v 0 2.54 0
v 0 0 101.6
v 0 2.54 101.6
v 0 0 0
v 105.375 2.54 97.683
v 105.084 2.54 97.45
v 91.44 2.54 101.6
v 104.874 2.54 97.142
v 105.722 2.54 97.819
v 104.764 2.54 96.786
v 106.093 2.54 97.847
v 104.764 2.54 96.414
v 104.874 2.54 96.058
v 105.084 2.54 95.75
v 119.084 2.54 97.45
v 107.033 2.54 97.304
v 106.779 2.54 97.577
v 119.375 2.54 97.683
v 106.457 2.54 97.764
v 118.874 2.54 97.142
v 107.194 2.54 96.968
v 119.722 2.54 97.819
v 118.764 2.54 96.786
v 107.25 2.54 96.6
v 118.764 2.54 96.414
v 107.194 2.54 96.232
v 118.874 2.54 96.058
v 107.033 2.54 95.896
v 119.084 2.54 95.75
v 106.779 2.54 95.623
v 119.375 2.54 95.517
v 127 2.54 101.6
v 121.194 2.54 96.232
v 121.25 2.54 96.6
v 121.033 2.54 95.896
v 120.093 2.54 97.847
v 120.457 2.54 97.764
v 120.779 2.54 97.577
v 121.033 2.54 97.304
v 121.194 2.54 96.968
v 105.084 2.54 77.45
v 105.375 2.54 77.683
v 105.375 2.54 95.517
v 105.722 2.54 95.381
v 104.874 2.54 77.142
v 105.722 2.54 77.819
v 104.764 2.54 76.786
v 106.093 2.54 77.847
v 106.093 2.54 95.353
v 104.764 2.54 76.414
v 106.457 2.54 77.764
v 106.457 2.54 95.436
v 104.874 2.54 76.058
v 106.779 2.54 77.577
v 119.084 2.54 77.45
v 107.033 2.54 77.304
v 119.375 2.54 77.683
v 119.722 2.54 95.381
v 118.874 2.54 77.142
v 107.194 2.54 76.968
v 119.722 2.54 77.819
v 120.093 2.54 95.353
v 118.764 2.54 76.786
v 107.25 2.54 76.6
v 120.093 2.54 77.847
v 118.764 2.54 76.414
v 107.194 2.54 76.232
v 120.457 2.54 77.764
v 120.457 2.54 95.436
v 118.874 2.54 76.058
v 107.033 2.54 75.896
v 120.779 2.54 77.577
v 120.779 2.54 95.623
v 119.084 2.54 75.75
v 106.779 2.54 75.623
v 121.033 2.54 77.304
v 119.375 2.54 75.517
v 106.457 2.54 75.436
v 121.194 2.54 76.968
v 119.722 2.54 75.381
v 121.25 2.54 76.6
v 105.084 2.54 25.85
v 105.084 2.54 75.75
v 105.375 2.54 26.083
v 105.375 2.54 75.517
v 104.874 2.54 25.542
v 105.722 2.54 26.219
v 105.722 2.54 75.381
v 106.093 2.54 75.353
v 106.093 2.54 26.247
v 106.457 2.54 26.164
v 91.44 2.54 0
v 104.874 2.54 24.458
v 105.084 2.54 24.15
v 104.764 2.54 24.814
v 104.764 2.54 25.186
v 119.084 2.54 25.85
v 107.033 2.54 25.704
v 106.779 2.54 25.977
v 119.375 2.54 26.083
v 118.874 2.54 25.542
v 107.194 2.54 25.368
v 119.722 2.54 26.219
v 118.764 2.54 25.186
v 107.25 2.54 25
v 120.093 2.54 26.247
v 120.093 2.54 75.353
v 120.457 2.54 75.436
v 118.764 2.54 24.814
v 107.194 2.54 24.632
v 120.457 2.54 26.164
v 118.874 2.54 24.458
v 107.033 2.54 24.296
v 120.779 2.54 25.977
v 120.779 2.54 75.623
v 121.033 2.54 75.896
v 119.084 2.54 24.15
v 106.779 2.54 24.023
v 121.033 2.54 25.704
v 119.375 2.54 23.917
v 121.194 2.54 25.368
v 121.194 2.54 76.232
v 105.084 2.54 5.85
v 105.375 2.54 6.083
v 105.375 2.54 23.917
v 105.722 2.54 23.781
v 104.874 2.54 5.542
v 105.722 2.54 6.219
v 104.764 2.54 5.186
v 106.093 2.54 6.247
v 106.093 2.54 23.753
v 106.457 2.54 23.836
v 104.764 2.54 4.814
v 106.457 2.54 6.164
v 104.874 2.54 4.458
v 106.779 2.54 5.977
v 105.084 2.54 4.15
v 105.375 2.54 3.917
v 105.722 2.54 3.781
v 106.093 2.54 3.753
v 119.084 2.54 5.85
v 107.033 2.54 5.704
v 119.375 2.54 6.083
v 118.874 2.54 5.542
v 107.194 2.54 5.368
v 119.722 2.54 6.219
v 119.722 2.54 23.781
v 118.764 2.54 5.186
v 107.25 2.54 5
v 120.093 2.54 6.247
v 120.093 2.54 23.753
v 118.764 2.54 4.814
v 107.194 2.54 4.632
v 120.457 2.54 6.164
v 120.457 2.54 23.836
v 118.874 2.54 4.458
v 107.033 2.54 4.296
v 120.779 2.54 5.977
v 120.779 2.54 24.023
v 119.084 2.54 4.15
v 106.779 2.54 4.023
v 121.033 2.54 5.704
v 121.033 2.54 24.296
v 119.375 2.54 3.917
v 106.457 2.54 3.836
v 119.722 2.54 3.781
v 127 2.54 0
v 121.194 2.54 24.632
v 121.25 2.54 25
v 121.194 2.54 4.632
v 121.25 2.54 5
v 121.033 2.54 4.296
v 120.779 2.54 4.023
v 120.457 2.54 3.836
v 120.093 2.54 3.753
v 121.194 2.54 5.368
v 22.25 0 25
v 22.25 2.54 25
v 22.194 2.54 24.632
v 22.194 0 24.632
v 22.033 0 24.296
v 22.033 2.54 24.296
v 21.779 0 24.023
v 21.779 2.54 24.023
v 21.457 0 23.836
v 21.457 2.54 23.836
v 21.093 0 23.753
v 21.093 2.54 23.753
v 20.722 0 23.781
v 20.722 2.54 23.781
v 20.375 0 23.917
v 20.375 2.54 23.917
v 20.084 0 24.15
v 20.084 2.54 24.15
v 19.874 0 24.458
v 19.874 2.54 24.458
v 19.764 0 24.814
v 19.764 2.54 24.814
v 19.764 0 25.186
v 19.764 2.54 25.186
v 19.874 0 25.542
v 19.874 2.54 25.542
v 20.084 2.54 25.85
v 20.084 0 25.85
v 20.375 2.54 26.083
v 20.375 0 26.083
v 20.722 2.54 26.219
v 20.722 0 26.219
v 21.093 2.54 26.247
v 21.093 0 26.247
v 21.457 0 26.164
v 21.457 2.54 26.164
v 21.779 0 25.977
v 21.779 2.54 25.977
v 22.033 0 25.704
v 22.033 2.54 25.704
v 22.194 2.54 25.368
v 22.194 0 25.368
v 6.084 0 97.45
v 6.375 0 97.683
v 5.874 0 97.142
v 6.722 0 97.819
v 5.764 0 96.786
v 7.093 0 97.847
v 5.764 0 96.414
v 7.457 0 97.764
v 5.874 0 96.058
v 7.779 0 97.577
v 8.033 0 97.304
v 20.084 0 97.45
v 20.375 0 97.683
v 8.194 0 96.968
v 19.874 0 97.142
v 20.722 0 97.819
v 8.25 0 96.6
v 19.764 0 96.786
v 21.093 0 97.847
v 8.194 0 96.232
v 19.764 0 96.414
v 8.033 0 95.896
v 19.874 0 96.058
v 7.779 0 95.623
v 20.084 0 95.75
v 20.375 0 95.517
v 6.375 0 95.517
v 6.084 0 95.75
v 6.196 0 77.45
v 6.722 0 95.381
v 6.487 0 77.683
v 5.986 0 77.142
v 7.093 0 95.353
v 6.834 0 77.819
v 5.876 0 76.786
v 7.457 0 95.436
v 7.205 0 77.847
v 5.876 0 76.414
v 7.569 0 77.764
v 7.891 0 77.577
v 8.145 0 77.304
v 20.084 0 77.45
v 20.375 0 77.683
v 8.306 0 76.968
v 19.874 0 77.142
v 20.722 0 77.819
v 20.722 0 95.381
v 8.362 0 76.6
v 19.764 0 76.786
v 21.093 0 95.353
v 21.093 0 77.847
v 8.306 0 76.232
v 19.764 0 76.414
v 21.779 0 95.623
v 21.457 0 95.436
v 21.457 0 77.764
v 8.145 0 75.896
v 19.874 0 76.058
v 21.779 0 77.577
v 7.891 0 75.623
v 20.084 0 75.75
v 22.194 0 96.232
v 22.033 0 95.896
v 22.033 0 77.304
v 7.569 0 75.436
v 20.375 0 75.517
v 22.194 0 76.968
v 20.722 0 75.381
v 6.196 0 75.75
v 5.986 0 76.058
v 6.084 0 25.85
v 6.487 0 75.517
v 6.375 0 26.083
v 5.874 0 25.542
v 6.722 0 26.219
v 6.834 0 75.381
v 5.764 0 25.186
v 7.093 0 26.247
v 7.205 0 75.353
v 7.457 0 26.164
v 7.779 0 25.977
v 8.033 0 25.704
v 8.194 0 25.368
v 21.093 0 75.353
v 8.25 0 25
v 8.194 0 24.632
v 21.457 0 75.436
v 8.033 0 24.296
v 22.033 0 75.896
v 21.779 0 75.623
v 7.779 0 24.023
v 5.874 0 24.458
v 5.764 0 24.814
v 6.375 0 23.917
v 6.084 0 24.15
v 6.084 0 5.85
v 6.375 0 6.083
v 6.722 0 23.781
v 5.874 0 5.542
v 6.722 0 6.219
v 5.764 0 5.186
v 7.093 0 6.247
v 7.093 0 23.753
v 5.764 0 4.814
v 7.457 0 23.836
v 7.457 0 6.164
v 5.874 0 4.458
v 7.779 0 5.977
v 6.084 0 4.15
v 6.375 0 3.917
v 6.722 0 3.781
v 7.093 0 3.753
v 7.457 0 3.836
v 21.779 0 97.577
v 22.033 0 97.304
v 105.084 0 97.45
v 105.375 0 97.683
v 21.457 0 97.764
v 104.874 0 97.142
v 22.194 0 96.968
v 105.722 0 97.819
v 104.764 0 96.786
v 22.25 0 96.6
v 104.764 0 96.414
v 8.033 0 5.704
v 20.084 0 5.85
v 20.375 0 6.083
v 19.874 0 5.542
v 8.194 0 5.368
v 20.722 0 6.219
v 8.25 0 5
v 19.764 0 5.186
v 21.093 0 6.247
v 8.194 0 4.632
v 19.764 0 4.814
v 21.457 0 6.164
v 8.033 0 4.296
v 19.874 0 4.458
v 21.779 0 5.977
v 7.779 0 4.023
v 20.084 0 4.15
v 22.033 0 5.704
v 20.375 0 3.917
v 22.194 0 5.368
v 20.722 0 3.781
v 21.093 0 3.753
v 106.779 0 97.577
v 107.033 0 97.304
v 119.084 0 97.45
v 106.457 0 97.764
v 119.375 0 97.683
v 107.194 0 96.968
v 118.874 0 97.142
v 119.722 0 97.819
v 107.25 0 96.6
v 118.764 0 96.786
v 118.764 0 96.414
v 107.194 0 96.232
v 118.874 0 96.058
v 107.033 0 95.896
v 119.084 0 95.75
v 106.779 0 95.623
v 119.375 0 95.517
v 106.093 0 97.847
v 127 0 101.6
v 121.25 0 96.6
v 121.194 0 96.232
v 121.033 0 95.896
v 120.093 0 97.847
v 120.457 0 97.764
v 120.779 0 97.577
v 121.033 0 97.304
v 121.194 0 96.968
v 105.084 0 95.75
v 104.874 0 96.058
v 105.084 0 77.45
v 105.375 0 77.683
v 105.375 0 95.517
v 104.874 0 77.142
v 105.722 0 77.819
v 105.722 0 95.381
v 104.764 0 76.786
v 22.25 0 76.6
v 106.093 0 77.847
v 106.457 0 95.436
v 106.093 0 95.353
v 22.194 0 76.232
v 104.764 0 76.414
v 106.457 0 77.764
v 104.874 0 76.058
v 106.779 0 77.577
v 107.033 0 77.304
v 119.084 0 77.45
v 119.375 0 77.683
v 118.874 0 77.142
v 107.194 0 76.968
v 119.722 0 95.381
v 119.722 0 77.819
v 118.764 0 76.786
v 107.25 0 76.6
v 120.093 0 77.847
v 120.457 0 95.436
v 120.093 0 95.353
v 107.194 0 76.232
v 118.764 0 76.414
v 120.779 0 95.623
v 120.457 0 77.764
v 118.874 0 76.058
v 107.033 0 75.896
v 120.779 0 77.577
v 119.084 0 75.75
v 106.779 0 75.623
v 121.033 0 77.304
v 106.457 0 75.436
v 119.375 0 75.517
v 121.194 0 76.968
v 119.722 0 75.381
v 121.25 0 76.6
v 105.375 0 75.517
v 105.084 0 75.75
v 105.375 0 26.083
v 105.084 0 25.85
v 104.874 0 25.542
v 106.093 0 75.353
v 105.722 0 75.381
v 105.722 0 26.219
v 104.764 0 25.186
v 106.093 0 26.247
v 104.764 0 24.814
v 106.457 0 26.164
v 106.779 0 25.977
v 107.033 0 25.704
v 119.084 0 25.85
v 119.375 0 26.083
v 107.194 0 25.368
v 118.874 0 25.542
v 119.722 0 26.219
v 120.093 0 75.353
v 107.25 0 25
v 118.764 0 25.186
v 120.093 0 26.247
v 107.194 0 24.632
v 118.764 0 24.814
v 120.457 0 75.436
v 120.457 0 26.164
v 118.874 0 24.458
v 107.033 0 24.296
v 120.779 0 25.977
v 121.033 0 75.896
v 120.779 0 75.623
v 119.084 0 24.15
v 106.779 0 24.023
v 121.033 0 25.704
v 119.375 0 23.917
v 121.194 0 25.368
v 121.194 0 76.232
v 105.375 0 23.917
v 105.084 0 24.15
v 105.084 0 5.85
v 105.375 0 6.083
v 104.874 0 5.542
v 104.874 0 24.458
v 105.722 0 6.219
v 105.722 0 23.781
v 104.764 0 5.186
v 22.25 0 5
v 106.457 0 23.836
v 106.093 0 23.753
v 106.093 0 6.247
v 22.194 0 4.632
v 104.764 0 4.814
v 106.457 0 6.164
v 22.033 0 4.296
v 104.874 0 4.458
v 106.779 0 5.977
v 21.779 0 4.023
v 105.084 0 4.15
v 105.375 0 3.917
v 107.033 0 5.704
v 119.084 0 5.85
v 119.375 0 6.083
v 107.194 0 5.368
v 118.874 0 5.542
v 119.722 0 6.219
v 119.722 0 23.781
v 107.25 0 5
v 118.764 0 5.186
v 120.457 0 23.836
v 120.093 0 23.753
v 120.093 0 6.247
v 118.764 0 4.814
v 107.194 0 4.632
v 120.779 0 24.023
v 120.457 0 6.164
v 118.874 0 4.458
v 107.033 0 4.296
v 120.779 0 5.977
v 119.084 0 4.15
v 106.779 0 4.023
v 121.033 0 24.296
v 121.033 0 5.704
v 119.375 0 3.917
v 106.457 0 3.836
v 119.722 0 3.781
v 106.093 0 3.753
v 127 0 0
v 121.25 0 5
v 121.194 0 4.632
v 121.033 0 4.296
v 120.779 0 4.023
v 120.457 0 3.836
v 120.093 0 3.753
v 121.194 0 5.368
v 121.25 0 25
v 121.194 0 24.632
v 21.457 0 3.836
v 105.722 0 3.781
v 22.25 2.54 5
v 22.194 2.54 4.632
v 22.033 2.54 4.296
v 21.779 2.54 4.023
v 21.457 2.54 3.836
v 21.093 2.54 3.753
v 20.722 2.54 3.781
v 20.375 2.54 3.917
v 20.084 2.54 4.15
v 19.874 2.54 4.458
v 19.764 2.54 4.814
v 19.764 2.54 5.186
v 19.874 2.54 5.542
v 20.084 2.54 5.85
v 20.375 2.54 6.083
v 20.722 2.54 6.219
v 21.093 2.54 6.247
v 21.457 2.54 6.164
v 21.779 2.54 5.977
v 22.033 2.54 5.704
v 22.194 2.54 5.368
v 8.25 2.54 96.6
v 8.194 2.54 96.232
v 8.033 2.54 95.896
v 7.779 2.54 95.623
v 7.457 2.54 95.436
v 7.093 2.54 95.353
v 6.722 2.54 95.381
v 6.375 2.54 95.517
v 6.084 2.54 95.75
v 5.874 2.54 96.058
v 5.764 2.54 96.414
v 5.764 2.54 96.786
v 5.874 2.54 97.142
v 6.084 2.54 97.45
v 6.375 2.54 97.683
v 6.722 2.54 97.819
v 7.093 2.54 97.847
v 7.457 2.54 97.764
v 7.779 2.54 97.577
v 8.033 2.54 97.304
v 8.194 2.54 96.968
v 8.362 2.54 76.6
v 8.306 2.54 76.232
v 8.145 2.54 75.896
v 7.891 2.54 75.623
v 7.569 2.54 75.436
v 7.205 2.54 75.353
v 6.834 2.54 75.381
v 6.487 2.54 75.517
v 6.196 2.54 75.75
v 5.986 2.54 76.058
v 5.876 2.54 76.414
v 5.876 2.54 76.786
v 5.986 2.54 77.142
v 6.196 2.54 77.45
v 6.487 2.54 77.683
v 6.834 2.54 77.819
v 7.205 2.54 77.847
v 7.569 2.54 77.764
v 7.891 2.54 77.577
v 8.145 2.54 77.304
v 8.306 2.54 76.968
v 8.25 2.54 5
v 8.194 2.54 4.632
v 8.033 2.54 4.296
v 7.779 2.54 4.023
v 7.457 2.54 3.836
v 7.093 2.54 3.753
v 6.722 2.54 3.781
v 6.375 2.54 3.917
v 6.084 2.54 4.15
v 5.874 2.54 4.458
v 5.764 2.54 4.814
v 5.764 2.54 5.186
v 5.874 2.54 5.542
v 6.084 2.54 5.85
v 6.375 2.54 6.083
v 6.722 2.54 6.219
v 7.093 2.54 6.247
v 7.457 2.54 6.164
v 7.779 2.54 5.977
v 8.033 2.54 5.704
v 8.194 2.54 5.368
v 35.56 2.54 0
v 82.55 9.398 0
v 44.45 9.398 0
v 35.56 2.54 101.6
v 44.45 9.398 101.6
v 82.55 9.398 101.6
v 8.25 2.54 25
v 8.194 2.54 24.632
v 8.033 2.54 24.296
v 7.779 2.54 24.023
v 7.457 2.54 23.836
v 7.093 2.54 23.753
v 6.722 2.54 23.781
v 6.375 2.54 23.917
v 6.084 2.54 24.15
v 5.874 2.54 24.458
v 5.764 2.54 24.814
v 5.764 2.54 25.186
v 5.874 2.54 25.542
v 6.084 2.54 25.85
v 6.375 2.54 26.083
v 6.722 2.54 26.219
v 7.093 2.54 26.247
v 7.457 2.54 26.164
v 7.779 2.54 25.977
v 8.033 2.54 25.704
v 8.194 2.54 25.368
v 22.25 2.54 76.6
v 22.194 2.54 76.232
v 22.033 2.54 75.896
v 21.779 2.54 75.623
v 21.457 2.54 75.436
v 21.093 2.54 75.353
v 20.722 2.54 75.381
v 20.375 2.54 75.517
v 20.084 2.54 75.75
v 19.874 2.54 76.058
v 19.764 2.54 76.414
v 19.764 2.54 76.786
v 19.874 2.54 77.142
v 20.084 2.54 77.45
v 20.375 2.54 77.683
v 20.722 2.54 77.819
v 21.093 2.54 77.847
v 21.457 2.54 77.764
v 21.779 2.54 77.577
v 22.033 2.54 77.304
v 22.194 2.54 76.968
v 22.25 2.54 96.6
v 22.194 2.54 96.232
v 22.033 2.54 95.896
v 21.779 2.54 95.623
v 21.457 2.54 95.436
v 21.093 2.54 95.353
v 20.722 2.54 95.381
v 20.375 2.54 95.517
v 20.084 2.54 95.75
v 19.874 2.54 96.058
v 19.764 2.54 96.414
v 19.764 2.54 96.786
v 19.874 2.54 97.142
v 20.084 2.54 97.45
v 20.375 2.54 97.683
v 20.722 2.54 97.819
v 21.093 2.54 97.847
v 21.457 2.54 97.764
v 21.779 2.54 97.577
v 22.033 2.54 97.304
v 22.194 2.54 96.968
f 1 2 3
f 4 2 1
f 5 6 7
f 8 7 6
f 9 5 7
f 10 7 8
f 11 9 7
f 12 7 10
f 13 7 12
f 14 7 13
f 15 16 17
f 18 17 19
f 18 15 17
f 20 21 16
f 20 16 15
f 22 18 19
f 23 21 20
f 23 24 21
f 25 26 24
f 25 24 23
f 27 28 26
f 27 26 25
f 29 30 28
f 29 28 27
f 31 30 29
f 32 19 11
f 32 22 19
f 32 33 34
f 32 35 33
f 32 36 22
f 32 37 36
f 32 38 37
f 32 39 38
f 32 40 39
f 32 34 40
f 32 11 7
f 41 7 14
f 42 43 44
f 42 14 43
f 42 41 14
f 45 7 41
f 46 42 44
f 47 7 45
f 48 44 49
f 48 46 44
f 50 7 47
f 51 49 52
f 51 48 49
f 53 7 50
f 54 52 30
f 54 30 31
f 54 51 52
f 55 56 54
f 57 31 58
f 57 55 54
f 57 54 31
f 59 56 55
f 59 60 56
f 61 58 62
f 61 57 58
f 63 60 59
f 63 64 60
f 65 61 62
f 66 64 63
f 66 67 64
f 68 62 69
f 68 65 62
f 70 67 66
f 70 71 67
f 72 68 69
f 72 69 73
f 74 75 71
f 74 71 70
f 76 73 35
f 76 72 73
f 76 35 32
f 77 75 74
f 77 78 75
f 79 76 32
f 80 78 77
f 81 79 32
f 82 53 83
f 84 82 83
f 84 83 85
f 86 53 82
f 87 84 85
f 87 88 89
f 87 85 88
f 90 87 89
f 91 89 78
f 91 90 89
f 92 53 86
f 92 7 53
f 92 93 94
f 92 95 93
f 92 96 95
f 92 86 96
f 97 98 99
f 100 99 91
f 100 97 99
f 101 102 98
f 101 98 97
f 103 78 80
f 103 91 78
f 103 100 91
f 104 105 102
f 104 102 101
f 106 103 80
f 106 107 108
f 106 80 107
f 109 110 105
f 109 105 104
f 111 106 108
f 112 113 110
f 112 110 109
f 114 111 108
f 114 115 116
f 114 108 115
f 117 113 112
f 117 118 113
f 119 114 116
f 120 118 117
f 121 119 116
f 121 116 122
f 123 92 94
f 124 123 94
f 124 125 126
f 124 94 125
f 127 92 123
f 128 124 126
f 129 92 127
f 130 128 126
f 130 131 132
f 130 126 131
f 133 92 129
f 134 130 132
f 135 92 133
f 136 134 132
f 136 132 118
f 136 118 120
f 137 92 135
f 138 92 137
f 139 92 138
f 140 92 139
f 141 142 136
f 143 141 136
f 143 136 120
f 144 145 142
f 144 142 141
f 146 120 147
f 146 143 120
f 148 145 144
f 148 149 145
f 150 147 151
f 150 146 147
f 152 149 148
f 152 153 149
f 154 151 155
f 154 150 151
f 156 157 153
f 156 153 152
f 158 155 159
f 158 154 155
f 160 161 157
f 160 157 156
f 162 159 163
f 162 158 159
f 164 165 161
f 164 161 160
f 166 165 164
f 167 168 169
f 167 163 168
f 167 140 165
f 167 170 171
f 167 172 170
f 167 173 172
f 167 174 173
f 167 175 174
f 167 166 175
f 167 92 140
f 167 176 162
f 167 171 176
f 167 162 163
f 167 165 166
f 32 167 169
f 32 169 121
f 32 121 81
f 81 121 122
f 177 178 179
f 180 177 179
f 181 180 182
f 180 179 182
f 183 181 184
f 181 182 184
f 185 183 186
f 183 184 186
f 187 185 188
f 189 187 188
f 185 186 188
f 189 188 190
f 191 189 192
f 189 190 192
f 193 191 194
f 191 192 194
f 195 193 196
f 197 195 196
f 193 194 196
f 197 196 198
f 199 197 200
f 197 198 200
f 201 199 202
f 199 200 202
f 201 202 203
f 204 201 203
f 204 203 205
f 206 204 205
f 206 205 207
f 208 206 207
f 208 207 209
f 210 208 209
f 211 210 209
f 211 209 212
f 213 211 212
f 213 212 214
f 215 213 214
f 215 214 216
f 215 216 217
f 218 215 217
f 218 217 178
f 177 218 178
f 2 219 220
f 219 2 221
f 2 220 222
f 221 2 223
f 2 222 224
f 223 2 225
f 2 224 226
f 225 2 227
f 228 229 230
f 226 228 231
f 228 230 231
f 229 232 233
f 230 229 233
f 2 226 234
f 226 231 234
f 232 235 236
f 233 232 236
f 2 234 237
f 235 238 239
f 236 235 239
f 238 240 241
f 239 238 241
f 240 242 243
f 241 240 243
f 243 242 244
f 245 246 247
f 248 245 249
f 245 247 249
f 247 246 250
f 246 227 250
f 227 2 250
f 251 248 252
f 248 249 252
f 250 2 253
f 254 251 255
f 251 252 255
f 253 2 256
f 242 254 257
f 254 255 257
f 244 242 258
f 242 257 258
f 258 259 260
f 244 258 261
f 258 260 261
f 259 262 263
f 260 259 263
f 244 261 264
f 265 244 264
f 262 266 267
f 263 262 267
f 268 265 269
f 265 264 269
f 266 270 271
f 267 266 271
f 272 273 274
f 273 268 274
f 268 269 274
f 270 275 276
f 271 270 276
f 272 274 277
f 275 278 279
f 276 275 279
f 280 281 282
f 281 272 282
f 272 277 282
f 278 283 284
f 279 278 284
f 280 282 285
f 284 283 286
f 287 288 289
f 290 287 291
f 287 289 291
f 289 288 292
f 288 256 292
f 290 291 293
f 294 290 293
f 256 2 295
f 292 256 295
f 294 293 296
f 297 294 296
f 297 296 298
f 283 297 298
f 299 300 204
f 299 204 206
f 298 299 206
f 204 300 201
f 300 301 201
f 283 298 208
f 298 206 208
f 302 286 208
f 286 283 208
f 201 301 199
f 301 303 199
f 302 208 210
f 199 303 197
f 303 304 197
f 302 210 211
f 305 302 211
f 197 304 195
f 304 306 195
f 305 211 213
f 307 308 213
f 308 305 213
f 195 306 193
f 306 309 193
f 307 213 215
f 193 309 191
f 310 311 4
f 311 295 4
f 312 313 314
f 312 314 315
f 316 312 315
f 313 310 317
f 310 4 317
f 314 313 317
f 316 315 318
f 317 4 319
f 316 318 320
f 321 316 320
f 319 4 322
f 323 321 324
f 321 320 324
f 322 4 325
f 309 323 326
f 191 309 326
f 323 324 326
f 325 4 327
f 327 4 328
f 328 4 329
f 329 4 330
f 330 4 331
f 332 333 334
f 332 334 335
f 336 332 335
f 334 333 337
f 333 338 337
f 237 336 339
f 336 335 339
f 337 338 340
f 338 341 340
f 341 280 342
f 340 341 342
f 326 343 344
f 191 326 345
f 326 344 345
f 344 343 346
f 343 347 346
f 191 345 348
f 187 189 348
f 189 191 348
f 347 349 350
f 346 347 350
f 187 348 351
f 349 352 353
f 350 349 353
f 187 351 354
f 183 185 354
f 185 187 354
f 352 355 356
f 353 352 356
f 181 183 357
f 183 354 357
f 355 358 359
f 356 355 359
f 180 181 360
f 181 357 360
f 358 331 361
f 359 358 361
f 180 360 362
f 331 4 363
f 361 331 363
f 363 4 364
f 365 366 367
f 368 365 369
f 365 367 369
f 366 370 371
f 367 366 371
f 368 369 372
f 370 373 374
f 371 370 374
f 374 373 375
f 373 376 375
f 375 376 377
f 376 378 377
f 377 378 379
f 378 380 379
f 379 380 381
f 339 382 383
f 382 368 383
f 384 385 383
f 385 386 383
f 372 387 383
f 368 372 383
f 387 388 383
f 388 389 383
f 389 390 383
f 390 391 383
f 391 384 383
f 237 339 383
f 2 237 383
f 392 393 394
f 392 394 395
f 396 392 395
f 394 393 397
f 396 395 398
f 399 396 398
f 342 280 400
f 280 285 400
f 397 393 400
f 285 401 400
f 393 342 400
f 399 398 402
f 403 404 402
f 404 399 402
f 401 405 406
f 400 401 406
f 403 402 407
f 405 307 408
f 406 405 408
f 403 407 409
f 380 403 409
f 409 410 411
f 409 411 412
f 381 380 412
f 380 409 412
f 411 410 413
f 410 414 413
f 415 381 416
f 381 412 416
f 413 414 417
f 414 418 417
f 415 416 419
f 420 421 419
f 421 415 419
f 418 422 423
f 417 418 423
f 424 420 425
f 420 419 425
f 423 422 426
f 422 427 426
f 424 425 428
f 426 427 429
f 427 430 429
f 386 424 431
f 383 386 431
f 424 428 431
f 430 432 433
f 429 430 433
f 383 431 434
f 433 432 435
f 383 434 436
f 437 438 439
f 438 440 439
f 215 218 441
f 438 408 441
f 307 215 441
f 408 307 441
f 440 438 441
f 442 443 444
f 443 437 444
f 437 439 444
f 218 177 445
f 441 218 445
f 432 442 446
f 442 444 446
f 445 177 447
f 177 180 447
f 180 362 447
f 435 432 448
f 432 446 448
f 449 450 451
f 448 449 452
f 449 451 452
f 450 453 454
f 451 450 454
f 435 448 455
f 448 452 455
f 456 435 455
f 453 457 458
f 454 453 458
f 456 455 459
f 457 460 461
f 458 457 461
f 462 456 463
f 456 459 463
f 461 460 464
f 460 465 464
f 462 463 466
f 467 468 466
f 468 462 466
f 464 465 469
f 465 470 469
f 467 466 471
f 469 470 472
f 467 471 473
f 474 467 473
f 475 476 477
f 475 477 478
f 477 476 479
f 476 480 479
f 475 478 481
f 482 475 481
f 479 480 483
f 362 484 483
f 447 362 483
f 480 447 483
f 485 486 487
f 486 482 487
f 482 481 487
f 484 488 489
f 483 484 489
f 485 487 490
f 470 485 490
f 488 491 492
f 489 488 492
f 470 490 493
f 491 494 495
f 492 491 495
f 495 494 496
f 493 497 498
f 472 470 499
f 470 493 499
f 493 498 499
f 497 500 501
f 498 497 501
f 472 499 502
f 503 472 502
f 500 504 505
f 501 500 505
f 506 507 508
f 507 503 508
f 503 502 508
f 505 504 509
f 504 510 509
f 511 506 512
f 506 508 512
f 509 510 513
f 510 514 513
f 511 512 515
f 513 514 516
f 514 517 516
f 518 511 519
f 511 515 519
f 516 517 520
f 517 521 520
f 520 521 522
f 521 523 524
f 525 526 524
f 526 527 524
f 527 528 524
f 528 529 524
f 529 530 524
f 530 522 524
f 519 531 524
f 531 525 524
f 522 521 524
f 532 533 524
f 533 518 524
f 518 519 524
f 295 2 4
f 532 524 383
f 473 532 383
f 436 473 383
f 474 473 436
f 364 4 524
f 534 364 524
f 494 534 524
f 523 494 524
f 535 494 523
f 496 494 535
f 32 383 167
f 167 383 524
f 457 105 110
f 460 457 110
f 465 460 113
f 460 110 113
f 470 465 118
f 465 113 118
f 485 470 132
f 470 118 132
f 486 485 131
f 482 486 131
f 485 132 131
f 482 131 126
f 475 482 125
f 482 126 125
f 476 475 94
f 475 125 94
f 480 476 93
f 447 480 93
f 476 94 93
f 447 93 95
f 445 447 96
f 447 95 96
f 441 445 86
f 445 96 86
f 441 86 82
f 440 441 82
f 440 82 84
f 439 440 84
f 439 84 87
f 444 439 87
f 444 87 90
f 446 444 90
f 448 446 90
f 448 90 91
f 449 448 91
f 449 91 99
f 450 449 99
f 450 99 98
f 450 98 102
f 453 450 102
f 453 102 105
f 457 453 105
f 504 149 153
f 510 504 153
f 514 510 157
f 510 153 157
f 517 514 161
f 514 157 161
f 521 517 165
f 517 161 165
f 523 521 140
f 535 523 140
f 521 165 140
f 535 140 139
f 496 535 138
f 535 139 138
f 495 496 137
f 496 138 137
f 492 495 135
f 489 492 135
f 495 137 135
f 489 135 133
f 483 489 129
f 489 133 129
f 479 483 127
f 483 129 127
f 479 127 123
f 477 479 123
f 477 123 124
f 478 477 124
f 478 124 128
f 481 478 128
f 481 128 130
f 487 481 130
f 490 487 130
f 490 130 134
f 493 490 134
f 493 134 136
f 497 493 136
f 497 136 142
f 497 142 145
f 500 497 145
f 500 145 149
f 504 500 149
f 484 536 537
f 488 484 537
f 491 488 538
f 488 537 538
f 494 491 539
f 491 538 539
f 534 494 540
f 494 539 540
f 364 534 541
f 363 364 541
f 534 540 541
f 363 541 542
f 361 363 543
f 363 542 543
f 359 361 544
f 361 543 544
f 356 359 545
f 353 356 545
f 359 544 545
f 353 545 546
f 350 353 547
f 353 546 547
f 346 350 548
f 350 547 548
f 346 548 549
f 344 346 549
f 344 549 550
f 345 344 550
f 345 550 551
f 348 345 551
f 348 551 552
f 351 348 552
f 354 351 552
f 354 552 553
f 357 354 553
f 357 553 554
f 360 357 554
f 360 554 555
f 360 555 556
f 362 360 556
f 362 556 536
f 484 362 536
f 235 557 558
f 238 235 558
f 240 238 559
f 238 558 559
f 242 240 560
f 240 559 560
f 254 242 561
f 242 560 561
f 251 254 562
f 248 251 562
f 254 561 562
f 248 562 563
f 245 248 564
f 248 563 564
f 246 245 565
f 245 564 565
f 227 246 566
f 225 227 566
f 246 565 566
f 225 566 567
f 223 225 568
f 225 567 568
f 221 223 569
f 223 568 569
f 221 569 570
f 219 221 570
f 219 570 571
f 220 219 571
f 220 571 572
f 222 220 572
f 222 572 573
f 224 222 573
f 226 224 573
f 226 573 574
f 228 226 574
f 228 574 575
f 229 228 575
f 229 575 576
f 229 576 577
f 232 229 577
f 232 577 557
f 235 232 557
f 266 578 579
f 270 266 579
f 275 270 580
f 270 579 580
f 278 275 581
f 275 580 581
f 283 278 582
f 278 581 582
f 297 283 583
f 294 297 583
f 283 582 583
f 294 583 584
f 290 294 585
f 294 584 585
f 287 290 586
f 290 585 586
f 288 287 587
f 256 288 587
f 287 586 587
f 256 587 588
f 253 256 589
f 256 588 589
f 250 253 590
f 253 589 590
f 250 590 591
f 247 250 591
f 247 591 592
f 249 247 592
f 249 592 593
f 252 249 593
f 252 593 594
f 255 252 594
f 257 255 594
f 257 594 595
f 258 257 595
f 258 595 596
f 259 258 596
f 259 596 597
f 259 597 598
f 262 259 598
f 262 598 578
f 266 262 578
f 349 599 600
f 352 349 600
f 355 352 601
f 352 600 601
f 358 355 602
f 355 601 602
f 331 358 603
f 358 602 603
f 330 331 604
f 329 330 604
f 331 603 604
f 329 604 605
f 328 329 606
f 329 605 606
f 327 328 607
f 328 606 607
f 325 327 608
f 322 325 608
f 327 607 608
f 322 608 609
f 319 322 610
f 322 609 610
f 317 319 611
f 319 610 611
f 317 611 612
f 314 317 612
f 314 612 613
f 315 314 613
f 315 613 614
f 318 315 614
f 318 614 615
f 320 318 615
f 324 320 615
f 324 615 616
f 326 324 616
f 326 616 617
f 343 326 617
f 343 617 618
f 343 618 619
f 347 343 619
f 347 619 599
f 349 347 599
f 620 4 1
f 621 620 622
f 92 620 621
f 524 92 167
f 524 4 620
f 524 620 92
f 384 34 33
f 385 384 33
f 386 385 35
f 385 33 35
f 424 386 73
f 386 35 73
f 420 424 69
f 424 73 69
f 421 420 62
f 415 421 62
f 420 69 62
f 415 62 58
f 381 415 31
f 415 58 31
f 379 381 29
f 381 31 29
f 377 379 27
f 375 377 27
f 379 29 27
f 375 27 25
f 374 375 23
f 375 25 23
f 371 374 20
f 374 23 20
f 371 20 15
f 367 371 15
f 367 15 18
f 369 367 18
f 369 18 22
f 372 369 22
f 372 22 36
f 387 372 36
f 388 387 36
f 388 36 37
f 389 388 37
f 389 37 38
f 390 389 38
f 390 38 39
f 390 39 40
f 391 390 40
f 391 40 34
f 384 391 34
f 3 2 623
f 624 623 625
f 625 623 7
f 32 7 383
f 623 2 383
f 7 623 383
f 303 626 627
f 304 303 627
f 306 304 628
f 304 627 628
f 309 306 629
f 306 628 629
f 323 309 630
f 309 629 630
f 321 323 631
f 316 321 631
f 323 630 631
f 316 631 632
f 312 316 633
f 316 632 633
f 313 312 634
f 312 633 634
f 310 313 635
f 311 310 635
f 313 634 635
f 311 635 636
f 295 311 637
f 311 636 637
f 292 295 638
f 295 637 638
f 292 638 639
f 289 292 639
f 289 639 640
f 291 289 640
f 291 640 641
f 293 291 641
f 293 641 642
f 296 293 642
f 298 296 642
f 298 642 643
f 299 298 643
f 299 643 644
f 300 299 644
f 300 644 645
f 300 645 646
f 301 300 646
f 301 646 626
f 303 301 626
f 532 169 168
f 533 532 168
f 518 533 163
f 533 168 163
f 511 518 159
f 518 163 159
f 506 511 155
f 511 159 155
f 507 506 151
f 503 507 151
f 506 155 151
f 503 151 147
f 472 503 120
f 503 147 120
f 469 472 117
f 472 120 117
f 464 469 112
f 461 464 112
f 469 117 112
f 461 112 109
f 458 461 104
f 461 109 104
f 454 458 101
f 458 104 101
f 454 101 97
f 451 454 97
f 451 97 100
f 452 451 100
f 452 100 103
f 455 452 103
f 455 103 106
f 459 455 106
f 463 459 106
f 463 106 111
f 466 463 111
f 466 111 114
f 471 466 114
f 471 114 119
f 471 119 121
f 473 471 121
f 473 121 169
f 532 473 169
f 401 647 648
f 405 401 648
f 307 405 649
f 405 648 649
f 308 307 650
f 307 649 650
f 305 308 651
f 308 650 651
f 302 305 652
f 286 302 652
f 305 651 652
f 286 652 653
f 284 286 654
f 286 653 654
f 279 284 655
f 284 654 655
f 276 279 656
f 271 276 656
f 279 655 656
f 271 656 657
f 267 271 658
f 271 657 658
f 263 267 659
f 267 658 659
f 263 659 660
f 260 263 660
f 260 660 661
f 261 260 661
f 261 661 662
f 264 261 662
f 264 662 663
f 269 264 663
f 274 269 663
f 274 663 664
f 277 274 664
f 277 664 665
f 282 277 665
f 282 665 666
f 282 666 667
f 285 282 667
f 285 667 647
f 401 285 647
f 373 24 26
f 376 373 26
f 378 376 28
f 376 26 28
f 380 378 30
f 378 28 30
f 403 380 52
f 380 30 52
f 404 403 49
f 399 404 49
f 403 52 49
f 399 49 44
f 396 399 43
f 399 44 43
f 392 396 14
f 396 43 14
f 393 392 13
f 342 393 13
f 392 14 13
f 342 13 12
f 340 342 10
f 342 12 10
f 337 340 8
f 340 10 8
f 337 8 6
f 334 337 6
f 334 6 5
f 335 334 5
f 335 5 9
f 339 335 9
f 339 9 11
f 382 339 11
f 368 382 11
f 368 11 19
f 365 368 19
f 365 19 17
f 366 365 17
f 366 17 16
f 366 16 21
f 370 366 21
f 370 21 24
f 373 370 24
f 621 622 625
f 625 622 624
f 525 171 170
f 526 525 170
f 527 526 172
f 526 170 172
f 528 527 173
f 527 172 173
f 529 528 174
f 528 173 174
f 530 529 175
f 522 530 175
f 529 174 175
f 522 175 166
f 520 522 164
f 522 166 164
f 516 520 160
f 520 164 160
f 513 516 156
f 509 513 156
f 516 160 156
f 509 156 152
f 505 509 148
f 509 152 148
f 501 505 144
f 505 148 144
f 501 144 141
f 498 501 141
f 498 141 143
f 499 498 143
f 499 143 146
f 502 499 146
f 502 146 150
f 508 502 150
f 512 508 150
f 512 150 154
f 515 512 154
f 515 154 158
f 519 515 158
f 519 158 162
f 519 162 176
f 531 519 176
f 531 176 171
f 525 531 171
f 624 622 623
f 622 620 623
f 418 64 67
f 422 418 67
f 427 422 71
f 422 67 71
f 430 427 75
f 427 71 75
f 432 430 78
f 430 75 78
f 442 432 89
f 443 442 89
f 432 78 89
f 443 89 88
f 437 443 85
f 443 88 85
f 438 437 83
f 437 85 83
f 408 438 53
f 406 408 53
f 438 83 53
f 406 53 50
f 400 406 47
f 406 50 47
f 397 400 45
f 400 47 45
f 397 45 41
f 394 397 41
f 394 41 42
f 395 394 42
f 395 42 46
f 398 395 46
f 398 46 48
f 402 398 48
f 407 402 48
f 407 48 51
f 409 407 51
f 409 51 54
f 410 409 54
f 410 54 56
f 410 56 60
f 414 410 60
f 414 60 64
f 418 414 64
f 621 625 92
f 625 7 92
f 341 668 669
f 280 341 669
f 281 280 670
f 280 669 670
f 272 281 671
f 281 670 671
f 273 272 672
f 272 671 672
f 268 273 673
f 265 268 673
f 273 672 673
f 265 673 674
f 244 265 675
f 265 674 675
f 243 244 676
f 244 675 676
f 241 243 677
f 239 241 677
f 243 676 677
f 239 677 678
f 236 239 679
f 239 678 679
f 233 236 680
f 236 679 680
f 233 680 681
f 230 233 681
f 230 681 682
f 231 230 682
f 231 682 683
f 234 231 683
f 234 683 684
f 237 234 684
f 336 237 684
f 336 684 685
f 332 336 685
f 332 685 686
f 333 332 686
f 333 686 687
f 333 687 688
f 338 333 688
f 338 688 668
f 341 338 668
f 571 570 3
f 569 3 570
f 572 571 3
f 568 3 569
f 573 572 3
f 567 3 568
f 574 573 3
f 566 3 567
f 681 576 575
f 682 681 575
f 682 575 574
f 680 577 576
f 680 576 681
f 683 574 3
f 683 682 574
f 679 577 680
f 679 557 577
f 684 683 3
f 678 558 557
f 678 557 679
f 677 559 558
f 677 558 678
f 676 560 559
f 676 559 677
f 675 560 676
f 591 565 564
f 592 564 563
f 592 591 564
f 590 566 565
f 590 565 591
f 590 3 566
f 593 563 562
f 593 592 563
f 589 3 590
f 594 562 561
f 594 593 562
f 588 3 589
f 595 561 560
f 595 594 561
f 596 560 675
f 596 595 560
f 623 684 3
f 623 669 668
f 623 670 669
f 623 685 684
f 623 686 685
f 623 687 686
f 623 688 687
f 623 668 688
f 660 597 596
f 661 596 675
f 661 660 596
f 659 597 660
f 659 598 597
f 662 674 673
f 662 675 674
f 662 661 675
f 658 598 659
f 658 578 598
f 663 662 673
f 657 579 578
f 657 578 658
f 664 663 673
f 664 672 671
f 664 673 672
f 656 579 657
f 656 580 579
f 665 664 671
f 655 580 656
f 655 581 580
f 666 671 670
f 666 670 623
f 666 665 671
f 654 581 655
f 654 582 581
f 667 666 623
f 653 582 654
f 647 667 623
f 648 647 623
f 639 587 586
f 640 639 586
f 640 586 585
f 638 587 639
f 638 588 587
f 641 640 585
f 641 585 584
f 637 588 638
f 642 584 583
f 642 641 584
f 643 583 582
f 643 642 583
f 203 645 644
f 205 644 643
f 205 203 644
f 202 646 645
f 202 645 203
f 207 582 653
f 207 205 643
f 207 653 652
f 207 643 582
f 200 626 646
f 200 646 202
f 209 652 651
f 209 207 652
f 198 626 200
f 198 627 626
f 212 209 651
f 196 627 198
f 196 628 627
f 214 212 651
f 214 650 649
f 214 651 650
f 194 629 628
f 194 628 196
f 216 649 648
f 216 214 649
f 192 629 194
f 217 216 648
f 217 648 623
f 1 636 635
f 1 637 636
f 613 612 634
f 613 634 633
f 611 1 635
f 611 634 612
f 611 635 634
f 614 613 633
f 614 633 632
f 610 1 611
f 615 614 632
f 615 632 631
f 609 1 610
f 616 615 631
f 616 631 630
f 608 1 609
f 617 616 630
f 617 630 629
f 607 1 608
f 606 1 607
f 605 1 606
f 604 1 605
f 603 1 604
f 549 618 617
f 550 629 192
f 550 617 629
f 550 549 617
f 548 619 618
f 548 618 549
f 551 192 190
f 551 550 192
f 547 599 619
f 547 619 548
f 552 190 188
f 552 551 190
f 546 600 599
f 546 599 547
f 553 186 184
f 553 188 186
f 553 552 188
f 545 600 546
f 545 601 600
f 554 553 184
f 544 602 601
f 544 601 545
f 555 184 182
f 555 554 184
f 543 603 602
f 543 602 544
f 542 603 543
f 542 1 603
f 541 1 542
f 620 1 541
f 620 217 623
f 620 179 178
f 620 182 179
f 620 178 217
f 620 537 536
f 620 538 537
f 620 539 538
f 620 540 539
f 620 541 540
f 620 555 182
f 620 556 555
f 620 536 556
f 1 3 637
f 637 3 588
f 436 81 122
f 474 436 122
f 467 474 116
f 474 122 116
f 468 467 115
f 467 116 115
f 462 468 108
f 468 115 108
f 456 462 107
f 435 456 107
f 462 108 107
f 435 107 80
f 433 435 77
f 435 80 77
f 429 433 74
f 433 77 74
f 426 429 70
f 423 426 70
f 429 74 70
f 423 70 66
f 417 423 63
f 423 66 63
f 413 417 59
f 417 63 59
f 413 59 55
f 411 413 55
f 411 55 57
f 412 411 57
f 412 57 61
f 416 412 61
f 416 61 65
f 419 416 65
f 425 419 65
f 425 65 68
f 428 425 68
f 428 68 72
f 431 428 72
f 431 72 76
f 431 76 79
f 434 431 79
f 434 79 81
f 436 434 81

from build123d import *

# Parameters (mm, degrees)
SKETCH1_W                   = 127
SKETCH1_H                   = 101.6
BOSS_EXTRUDE1_DEPTH         = 2.54
TAP_DRILL_FOR_M3X0_5_TAP1_D = 2.5


with BuildPart() as part:
    # Sketch1 → Boss-Extrude1 (new body)
    with BuildSketch(Plane(origin=(0, 0, 0), x_dir=(1, 0, 0), z_dir=(0, 1, 0))):
        with Locations((63.5, -50.8)):
            Rectangle(SKETCH1_W, SKETCH1_H)
    extrude(amount=BOSS_EXTRUDE1_DEPTH)

    # Tap Drill for M3x0.5 Tap1 (through all)
    with Locations(Plane(origin=(0, 0, 0), x_dir=(-1, 0, 0), z_dir=(0, -1, 0))):
        with Locations((-106, -76.6), (-120, -5), (-120, -25), (-106, -5), (-106, -25), (-120, -76.6), (-131.288, -76.6), (-120, -96.6), (-106, -96.6), (-21, -96.6), (-21, -76.6), (-7.112, -76.6), (-7, -96.6), (-21, -25), (-21, -5), (-7, -5), (-7, -25)):
            Hole(TAP_DRILL_FOR_M3X0_5_TAP1_D / 2)

    # Sketch7 → Loft1 section 0
    with BuildSketch(Plane(origin=(0, 9.398, 0), x_dir=(1, 0, 0), z_dir=(0, 1, 0))):
        with BuildLine():
            Line((82.55, 0), (44.45, 0))
            Line((44.45, 0), (44.45, -101.6))
            Line((44.45, -101.6), (82.55, -101.6))
            Line((82.55, -101.6), (82.55, 0))
        make_face()
    # Sketch6 → Loft1 section 1
    with BuildSketch(Plane(origin=(0, 2.54, 0), x_dir=(1, 0, 0), z_dir=(0, 1, 0))):
        with BuildLine():
            Line((35.56, 0), (91.44, 0))
            Line((91.44, 0), (91.44, -101.6))
            Line((91.44, -101.6), (35.56, -101.6))
            Line((35.56, -101.6), (35.56, 0))
        make_face()
    loft()


solid = part.part
